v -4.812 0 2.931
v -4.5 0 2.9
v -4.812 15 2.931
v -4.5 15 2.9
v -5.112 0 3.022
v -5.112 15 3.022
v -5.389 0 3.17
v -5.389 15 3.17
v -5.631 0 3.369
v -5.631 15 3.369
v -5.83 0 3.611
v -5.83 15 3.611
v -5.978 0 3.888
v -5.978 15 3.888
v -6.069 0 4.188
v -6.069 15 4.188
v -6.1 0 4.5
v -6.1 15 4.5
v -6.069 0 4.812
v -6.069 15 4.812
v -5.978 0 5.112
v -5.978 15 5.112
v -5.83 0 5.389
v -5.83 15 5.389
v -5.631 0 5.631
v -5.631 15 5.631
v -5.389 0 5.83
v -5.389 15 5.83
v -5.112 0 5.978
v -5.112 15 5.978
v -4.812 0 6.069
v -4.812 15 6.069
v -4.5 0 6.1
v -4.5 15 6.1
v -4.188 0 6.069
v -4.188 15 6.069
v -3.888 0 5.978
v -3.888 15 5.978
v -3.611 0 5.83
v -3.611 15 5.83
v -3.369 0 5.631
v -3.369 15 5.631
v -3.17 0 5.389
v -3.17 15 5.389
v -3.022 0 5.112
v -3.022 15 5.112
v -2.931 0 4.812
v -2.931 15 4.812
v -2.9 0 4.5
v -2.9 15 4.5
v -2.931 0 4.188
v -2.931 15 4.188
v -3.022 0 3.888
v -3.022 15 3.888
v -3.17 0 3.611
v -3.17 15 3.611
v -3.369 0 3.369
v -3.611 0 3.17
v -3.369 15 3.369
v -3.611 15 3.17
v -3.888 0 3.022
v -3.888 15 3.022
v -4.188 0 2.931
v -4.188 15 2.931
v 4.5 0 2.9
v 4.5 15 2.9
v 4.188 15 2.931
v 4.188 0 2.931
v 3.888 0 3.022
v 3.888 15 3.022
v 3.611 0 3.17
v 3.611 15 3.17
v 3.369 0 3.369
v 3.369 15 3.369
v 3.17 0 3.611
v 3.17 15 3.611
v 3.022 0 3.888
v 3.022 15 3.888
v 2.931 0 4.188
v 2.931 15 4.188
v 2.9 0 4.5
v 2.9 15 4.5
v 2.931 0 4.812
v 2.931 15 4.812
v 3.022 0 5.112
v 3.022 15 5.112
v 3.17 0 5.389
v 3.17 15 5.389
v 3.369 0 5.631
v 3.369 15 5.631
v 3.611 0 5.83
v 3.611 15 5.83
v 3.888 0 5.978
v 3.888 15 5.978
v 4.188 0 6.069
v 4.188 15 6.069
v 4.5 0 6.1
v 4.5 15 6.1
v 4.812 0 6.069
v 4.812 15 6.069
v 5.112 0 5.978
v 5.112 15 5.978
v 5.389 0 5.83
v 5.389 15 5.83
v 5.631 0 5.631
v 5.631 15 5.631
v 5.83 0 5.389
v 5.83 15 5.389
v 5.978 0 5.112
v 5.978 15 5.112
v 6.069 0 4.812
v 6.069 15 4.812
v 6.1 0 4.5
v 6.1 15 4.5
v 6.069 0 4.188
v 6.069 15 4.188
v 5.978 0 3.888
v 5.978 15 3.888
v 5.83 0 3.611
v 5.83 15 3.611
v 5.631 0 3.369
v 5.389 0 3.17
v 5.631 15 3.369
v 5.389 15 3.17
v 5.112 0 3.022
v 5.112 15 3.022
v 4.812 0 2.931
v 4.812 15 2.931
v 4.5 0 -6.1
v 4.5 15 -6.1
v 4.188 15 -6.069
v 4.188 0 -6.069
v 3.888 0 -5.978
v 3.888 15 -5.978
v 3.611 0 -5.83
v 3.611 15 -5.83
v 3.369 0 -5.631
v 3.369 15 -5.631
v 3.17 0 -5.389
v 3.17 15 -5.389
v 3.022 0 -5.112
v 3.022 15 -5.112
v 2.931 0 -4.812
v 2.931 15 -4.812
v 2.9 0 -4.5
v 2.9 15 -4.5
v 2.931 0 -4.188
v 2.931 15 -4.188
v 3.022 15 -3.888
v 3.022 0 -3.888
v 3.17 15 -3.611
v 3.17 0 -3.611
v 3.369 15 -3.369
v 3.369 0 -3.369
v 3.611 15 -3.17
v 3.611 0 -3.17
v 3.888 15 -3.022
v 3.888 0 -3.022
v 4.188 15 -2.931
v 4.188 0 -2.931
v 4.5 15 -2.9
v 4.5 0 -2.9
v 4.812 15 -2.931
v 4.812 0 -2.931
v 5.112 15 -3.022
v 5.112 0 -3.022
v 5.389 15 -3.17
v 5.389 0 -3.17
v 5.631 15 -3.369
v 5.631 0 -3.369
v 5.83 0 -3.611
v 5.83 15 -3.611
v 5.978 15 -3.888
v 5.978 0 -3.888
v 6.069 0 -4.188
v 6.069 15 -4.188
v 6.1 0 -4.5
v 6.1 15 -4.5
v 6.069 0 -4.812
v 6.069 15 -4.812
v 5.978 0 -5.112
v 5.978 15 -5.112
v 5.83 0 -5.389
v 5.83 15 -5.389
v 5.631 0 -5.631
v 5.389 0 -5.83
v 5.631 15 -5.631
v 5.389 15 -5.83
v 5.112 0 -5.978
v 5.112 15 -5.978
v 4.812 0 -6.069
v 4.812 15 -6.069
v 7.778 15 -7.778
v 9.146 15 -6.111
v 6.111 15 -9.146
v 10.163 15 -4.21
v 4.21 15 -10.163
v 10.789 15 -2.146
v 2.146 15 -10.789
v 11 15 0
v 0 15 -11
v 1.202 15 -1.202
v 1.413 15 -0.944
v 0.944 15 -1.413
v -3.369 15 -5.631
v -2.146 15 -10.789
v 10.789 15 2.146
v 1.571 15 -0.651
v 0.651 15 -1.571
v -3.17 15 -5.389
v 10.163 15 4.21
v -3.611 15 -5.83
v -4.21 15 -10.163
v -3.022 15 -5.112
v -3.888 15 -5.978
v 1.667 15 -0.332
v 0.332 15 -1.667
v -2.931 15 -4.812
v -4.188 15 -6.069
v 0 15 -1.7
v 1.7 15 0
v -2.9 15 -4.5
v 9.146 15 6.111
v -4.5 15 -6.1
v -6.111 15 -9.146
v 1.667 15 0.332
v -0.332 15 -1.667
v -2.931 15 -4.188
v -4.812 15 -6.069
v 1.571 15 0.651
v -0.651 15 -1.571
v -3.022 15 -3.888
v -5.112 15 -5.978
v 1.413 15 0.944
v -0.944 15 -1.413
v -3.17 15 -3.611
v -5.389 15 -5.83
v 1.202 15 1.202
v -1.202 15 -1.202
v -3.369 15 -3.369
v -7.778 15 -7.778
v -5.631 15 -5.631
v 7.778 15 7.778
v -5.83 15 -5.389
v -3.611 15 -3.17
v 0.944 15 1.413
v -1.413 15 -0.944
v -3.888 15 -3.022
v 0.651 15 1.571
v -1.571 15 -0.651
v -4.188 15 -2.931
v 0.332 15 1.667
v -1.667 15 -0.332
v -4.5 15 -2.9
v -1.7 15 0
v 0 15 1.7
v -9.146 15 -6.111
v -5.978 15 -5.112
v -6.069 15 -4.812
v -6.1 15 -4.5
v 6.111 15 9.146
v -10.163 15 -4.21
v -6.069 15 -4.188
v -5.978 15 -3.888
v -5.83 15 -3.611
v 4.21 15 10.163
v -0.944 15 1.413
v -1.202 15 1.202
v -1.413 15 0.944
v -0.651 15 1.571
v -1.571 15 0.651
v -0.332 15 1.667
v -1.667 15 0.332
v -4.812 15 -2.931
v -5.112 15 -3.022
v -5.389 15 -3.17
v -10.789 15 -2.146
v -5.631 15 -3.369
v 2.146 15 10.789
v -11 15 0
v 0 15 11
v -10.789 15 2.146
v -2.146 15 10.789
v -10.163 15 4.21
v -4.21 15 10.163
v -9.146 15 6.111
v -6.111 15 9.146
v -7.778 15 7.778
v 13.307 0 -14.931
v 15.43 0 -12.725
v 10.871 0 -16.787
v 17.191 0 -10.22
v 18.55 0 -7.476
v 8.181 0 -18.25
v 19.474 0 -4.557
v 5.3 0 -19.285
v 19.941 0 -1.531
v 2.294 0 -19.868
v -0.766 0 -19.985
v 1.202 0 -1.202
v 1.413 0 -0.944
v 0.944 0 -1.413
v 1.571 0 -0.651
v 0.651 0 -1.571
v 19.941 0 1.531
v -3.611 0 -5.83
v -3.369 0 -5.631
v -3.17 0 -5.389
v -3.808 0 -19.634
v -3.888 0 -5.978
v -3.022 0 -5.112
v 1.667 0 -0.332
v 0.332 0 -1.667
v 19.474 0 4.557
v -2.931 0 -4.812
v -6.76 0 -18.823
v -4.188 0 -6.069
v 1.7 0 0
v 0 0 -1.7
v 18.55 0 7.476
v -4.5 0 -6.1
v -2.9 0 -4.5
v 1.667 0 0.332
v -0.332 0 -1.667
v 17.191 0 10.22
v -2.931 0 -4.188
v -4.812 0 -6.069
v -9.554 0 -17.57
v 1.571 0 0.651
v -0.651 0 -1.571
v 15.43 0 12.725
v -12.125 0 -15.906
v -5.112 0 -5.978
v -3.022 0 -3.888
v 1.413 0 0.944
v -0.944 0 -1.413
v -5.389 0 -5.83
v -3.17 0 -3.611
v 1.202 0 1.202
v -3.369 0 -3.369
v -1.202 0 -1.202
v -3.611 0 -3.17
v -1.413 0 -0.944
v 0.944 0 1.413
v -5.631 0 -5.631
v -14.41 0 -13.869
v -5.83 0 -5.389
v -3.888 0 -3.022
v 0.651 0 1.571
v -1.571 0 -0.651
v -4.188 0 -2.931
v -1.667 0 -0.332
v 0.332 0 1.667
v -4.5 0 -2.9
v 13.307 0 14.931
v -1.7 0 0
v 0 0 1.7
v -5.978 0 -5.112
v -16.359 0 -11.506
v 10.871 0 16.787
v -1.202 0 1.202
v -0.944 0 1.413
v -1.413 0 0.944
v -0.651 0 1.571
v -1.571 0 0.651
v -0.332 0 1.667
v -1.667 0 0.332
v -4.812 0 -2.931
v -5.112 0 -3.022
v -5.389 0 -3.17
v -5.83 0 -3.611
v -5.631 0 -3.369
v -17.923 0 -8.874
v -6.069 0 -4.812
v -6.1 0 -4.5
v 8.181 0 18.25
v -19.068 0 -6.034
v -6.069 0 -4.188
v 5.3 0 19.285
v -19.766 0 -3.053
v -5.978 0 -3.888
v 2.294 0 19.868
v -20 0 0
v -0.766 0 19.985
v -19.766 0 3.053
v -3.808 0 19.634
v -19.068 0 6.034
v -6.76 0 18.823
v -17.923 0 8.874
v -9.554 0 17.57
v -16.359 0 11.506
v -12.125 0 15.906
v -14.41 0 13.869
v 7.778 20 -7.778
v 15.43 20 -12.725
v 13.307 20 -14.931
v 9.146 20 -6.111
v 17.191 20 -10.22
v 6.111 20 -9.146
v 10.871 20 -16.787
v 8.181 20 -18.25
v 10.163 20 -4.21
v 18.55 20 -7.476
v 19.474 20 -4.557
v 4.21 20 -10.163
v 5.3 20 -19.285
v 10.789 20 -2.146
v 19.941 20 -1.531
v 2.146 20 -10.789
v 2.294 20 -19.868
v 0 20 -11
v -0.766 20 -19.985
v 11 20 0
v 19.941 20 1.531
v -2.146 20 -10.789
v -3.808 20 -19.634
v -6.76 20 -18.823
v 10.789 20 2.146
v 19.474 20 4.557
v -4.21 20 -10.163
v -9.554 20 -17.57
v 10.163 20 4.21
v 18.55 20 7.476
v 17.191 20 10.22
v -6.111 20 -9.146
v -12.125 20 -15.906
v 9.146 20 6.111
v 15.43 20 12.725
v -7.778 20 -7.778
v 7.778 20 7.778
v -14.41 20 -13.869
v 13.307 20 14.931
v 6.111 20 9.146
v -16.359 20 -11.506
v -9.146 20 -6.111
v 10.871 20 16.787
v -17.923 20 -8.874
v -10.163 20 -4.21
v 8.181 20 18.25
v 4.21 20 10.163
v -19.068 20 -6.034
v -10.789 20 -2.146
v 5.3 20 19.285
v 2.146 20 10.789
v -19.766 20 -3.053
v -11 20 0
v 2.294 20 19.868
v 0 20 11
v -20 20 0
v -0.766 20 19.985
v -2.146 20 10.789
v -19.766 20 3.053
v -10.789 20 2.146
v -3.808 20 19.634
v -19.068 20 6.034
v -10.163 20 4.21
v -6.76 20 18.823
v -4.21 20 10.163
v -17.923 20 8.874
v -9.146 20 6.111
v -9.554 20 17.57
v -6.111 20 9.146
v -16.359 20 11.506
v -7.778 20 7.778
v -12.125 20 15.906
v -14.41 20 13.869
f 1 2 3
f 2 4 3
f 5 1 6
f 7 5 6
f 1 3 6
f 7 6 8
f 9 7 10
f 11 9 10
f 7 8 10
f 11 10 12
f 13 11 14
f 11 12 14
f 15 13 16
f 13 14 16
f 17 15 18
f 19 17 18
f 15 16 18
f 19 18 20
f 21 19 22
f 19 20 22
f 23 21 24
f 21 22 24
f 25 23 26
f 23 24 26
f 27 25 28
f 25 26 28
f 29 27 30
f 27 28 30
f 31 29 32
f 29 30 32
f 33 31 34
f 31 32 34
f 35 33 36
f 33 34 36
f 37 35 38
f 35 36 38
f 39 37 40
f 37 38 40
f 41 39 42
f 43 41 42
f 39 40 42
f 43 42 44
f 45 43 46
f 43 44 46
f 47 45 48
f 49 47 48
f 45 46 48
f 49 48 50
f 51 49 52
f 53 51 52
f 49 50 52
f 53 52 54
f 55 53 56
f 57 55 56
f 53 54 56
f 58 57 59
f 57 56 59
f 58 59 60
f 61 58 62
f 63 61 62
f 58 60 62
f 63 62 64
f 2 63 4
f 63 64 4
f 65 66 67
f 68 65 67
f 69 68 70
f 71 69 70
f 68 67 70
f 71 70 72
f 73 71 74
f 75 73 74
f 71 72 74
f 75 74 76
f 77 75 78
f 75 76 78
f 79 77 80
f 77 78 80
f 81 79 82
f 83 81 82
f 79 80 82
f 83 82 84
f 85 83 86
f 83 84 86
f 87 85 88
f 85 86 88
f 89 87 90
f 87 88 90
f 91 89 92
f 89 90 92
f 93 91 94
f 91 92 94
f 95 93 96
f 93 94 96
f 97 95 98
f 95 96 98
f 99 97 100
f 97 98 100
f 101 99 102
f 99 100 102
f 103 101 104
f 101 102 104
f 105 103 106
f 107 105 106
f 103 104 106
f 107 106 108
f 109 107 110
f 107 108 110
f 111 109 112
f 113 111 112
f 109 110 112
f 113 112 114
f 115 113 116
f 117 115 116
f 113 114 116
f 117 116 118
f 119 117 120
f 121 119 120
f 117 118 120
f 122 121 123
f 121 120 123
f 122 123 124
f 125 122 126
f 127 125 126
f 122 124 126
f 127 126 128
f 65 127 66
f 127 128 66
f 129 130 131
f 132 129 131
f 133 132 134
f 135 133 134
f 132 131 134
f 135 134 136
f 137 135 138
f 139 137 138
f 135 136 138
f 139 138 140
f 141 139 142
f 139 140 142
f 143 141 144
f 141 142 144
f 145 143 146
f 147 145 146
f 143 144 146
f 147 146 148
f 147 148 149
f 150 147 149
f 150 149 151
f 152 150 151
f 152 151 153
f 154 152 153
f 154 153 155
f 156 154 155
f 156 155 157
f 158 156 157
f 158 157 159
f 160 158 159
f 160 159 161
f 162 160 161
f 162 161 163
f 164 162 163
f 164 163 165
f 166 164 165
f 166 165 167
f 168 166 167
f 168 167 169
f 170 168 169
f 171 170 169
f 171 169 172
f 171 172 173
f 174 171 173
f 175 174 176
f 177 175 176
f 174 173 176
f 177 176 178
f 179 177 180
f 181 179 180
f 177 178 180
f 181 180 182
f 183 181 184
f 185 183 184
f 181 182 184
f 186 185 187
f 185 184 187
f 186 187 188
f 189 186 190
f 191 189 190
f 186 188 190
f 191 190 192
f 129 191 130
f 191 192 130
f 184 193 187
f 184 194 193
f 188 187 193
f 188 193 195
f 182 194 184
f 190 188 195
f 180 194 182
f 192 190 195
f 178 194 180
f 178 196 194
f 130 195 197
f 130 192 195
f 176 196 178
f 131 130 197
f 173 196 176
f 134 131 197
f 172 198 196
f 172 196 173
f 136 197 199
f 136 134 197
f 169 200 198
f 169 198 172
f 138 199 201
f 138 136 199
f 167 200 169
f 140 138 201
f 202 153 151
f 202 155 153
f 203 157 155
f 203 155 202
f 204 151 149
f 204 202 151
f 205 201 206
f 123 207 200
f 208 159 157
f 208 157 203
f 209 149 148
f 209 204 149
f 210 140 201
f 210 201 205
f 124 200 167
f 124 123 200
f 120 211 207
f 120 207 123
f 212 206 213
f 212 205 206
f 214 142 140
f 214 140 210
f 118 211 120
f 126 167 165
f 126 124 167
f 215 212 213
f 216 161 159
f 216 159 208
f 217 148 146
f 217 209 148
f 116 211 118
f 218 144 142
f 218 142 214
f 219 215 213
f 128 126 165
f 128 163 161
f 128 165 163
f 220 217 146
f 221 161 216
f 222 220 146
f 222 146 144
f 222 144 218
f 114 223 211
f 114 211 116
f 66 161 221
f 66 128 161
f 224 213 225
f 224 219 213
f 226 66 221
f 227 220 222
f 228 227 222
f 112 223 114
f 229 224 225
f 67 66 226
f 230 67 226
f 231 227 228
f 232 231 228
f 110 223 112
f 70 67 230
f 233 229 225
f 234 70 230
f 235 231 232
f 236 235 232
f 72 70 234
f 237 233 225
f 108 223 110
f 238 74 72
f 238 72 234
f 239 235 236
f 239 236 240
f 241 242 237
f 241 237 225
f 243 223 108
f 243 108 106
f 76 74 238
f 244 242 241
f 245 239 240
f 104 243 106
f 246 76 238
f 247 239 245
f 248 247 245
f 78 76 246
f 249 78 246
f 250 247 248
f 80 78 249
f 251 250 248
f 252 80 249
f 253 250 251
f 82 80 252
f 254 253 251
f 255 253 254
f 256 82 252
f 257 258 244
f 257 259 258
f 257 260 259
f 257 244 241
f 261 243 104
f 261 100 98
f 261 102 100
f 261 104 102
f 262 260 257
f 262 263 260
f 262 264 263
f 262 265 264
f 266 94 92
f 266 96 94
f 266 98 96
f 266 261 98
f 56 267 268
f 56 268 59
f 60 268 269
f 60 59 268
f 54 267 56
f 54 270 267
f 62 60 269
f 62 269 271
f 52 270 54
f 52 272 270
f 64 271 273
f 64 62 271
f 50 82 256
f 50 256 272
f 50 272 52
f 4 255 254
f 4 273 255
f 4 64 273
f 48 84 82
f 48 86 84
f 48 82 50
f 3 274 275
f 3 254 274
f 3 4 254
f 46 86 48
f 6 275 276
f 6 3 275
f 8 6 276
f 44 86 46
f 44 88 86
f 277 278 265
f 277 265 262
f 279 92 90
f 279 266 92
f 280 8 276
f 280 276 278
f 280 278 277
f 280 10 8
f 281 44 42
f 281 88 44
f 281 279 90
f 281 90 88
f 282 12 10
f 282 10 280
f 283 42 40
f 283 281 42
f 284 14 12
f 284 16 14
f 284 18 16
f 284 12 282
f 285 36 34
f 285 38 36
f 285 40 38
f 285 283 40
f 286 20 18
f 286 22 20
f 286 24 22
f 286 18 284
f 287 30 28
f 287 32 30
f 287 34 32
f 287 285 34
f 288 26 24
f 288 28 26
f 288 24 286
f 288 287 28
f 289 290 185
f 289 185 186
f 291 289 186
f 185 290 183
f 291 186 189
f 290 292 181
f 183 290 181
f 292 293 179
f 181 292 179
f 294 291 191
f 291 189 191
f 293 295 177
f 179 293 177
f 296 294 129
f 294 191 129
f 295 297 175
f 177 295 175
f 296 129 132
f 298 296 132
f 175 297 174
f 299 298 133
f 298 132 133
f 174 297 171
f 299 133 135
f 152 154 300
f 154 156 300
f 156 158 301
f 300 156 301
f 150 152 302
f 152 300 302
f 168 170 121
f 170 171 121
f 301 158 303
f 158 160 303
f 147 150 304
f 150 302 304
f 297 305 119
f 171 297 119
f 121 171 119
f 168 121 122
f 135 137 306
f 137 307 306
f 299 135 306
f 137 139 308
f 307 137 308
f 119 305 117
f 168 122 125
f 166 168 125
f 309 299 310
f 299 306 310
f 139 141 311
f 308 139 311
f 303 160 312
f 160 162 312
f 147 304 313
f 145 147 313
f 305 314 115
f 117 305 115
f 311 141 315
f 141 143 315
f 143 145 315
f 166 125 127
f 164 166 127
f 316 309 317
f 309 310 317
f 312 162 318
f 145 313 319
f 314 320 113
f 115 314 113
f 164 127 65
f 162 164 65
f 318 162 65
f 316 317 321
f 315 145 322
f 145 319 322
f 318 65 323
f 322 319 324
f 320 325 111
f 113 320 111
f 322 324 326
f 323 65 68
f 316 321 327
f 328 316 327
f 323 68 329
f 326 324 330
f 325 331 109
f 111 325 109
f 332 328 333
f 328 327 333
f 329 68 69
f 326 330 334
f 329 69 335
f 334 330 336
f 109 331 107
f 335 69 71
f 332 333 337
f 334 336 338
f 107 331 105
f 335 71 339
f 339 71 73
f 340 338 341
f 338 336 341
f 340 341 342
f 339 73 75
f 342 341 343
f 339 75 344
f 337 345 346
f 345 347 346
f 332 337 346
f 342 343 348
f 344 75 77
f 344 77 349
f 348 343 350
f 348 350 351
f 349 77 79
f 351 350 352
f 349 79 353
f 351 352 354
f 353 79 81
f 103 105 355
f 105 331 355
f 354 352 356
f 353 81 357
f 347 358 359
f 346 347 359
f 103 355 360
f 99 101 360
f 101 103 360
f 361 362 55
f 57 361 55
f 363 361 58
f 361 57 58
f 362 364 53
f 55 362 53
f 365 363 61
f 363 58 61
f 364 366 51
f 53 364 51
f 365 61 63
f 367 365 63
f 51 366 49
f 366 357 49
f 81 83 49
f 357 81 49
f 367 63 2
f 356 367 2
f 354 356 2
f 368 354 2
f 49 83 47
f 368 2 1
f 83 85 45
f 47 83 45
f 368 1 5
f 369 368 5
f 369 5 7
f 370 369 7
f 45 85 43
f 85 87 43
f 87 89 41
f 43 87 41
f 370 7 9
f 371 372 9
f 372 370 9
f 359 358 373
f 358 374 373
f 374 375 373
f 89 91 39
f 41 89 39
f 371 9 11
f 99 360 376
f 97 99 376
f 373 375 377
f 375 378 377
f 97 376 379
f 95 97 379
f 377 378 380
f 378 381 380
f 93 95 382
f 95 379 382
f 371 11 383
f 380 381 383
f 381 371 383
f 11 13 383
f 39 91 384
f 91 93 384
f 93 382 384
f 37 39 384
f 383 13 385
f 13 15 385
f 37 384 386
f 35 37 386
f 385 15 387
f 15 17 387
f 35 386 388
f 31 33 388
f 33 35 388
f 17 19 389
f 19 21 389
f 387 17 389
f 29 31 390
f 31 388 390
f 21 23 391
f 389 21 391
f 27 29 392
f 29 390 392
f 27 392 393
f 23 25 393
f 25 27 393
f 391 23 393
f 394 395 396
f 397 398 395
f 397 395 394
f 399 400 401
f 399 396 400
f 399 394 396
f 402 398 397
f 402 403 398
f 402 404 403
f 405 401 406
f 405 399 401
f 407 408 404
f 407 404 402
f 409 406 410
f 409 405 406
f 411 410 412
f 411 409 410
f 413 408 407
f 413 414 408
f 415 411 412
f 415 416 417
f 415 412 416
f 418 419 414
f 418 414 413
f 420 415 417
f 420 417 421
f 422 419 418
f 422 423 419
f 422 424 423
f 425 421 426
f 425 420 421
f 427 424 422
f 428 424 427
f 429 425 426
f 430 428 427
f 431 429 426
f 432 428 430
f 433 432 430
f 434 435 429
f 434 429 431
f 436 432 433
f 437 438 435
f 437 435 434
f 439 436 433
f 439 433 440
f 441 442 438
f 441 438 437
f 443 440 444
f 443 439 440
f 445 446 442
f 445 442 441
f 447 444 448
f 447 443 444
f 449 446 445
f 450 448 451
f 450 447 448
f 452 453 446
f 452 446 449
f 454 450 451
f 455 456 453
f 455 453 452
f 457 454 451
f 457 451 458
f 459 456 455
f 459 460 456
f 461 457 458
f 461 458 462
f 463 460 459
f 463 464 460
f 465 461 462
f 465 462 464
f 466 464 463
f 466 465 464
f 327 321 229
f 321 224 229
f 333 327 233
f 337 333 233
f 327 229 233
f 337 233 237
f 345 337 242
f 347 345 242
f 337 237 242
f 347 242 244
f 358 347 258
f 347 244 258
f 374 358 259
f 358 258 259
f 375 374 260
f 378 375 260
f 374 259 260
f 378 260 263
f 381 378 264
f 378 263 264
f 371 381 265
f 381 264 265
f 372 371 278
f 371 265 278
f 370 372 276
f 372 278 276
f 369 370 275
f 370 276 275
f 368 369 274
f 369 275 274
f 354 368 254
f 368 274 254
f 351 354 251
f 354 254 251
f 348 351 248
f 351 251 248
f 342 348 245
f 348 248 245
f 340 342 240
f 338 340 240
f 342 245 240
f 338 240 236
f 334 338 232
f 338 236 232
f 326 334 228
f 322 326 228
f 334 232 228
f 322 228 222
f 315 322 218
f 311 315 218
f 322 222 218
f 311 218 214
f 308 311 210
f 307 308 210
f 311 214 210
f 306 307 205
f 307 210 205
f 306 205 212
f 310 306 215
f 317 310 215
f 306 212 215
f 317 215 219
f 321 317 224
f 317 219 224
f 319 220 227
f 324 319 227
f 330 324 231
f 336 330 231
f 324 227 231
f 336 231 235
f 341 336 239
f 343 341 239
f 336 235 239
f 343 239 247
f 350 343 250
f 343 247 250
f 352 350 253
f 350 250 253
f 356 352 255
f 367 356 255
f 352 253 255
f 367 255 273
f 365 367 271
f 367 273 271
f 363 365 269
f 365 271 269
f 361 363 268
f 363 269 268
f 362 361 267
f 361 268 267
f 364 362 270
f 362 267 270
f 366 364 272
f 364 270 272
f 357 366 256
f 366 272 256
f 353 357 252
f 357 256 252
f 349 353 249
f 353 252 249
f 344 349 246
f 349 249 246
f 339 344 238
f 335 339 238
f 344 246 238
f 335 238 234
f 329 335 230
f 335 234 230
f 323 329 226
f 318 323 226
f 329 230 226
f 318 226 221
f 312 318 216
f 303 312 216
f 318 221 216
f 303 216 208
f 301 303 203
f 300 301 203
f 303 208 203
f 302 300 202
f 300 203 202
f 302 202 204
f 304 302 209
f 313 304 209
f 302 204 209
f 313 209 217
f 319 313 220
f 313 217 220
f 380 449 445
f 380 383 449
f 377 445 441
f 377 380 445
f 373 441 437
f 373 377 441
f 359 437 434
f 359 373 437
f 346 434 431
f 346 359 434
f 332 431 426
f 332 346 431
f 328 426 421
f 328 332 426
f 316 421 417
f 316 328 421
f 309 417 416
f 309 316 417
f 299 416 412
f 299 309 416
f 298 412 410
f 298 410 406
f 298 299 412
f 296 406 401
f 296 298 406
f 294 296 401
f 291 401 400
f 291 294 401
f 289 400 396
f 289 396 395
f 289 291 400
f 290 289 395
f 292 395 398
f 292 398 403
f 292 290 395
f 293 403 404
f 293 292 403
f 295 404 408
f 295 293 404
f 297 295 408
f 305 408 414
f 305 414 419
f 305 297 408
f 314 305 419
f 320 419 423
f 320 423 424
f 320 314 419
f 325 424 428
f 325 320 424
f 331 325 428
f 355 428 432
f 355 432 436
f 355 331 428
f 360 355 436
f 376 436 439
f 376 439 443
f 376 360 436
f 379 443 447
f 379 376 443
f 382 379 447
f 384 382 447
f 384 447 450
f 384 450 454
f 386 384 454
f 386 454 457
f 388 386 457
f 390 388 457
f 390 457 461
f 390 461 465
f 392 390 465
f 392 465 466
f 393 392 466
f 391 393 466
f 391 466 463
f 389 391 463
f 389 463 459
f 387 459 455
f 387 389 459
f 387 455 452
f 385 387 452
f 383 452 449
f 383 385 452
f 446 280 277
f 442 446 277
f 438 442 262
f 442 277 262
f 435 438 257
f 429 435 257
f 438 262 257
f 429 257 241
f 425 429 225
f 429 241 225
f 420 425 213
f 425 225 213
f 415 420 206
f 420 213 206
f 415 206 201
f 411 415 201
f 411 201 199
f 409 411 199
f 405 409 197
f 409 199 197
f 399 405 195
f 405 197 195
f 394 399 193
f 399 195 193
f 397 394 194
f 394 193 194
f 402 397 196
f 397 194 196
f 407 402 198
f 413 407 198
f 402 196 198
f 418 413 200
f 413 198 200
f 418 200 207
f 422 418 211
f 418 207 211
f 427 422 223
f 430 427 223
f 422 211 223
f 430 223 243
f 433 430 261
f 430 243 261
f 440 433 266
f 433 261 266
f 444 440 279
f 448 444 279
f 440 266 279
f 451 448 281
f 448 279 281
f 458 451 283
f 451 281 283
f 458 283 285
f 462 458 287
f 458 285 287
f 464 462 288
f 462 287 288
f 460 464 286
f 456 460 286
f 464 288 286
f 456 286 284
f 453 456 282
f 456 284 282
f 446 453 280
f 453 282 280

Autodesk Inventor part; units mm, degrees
ref_plane "YZ Plane" through (0, 0, 0) normal (1, 0, 0) x (0, 1, 0)
ref_plane "XZ Plane" through (0, 0, 0) normal (0, 1, 0) x (-1, 0, 0)
ref_plane "XY Plane" through (0, 0, 0) normal (0, 0, 1) x (1, 0, 0)
sketch "Szkic1" plane through (0, 0, 0) normal (0, 1, 0) x (-1, 0, 0)
  circle A0 centre (0, 0) radius 20
  circle A1 centre (0, 0) radius 12.5
  circle A2 centre (0, 0) radius 11
  line L0 (20, 0) -> (-20, 0)
  line L1 (0, 20) -> (0, -20)
  point P0 (4.5, -4.5)
  point P1 (-4.5, -4.5)
  point P2 (4.5, 4.5)
  point P3 (-4.5, 4.5)
  dimension "d0" = 40
  dimension "d1" = 25
  dimension "d2" = 22
  dimension "d3" = 40
  dimension "d6" = 40
  dimension "d35" = 9
  dimension "d36" = 4.5
  dimension "d37" = 4.5
  dimension "d38" = 4.5
extrude "Wyciągnięcie proste1" add sketch "Szkic1" along normal blind 20 contours L0 A1 L1 A0 | A0 L1 A1 L0 | L1 A1 L0 A0 | A0 L0 A1 L1 | L0 A2 L1 A1 | A1 L1 A2 L0 | L1 A2 L0 A1 | A1 L0 A2 L1
extrude "Wyciągnięcie proste2" add sketch "Szkic1" along normal blind 15 contours L0 L1 A2 | A2 L1 L0 | L1 L0 A2 | A2 L0 L1
hole "Otwór2" at (0, 0, 0) direction (0, 1, 0) diameter 3.4 end through all clearance for "Countersunk Flat Head Screw ISO 2009/7046" size "M3" standard "ISO"
hole "Hole4" at (-4.5, 0, -4.5) at (4.5, 0, -4.5) at (-4.5, 0, 4.5) at (4.5, 0, 4.5) direction (0, 1, 0) diameter 3.2 depth 30 clearance for "Slotted Cheese Head Screw ISO 1207" size "M3" standard "ISO"
properties part number "wheel"
